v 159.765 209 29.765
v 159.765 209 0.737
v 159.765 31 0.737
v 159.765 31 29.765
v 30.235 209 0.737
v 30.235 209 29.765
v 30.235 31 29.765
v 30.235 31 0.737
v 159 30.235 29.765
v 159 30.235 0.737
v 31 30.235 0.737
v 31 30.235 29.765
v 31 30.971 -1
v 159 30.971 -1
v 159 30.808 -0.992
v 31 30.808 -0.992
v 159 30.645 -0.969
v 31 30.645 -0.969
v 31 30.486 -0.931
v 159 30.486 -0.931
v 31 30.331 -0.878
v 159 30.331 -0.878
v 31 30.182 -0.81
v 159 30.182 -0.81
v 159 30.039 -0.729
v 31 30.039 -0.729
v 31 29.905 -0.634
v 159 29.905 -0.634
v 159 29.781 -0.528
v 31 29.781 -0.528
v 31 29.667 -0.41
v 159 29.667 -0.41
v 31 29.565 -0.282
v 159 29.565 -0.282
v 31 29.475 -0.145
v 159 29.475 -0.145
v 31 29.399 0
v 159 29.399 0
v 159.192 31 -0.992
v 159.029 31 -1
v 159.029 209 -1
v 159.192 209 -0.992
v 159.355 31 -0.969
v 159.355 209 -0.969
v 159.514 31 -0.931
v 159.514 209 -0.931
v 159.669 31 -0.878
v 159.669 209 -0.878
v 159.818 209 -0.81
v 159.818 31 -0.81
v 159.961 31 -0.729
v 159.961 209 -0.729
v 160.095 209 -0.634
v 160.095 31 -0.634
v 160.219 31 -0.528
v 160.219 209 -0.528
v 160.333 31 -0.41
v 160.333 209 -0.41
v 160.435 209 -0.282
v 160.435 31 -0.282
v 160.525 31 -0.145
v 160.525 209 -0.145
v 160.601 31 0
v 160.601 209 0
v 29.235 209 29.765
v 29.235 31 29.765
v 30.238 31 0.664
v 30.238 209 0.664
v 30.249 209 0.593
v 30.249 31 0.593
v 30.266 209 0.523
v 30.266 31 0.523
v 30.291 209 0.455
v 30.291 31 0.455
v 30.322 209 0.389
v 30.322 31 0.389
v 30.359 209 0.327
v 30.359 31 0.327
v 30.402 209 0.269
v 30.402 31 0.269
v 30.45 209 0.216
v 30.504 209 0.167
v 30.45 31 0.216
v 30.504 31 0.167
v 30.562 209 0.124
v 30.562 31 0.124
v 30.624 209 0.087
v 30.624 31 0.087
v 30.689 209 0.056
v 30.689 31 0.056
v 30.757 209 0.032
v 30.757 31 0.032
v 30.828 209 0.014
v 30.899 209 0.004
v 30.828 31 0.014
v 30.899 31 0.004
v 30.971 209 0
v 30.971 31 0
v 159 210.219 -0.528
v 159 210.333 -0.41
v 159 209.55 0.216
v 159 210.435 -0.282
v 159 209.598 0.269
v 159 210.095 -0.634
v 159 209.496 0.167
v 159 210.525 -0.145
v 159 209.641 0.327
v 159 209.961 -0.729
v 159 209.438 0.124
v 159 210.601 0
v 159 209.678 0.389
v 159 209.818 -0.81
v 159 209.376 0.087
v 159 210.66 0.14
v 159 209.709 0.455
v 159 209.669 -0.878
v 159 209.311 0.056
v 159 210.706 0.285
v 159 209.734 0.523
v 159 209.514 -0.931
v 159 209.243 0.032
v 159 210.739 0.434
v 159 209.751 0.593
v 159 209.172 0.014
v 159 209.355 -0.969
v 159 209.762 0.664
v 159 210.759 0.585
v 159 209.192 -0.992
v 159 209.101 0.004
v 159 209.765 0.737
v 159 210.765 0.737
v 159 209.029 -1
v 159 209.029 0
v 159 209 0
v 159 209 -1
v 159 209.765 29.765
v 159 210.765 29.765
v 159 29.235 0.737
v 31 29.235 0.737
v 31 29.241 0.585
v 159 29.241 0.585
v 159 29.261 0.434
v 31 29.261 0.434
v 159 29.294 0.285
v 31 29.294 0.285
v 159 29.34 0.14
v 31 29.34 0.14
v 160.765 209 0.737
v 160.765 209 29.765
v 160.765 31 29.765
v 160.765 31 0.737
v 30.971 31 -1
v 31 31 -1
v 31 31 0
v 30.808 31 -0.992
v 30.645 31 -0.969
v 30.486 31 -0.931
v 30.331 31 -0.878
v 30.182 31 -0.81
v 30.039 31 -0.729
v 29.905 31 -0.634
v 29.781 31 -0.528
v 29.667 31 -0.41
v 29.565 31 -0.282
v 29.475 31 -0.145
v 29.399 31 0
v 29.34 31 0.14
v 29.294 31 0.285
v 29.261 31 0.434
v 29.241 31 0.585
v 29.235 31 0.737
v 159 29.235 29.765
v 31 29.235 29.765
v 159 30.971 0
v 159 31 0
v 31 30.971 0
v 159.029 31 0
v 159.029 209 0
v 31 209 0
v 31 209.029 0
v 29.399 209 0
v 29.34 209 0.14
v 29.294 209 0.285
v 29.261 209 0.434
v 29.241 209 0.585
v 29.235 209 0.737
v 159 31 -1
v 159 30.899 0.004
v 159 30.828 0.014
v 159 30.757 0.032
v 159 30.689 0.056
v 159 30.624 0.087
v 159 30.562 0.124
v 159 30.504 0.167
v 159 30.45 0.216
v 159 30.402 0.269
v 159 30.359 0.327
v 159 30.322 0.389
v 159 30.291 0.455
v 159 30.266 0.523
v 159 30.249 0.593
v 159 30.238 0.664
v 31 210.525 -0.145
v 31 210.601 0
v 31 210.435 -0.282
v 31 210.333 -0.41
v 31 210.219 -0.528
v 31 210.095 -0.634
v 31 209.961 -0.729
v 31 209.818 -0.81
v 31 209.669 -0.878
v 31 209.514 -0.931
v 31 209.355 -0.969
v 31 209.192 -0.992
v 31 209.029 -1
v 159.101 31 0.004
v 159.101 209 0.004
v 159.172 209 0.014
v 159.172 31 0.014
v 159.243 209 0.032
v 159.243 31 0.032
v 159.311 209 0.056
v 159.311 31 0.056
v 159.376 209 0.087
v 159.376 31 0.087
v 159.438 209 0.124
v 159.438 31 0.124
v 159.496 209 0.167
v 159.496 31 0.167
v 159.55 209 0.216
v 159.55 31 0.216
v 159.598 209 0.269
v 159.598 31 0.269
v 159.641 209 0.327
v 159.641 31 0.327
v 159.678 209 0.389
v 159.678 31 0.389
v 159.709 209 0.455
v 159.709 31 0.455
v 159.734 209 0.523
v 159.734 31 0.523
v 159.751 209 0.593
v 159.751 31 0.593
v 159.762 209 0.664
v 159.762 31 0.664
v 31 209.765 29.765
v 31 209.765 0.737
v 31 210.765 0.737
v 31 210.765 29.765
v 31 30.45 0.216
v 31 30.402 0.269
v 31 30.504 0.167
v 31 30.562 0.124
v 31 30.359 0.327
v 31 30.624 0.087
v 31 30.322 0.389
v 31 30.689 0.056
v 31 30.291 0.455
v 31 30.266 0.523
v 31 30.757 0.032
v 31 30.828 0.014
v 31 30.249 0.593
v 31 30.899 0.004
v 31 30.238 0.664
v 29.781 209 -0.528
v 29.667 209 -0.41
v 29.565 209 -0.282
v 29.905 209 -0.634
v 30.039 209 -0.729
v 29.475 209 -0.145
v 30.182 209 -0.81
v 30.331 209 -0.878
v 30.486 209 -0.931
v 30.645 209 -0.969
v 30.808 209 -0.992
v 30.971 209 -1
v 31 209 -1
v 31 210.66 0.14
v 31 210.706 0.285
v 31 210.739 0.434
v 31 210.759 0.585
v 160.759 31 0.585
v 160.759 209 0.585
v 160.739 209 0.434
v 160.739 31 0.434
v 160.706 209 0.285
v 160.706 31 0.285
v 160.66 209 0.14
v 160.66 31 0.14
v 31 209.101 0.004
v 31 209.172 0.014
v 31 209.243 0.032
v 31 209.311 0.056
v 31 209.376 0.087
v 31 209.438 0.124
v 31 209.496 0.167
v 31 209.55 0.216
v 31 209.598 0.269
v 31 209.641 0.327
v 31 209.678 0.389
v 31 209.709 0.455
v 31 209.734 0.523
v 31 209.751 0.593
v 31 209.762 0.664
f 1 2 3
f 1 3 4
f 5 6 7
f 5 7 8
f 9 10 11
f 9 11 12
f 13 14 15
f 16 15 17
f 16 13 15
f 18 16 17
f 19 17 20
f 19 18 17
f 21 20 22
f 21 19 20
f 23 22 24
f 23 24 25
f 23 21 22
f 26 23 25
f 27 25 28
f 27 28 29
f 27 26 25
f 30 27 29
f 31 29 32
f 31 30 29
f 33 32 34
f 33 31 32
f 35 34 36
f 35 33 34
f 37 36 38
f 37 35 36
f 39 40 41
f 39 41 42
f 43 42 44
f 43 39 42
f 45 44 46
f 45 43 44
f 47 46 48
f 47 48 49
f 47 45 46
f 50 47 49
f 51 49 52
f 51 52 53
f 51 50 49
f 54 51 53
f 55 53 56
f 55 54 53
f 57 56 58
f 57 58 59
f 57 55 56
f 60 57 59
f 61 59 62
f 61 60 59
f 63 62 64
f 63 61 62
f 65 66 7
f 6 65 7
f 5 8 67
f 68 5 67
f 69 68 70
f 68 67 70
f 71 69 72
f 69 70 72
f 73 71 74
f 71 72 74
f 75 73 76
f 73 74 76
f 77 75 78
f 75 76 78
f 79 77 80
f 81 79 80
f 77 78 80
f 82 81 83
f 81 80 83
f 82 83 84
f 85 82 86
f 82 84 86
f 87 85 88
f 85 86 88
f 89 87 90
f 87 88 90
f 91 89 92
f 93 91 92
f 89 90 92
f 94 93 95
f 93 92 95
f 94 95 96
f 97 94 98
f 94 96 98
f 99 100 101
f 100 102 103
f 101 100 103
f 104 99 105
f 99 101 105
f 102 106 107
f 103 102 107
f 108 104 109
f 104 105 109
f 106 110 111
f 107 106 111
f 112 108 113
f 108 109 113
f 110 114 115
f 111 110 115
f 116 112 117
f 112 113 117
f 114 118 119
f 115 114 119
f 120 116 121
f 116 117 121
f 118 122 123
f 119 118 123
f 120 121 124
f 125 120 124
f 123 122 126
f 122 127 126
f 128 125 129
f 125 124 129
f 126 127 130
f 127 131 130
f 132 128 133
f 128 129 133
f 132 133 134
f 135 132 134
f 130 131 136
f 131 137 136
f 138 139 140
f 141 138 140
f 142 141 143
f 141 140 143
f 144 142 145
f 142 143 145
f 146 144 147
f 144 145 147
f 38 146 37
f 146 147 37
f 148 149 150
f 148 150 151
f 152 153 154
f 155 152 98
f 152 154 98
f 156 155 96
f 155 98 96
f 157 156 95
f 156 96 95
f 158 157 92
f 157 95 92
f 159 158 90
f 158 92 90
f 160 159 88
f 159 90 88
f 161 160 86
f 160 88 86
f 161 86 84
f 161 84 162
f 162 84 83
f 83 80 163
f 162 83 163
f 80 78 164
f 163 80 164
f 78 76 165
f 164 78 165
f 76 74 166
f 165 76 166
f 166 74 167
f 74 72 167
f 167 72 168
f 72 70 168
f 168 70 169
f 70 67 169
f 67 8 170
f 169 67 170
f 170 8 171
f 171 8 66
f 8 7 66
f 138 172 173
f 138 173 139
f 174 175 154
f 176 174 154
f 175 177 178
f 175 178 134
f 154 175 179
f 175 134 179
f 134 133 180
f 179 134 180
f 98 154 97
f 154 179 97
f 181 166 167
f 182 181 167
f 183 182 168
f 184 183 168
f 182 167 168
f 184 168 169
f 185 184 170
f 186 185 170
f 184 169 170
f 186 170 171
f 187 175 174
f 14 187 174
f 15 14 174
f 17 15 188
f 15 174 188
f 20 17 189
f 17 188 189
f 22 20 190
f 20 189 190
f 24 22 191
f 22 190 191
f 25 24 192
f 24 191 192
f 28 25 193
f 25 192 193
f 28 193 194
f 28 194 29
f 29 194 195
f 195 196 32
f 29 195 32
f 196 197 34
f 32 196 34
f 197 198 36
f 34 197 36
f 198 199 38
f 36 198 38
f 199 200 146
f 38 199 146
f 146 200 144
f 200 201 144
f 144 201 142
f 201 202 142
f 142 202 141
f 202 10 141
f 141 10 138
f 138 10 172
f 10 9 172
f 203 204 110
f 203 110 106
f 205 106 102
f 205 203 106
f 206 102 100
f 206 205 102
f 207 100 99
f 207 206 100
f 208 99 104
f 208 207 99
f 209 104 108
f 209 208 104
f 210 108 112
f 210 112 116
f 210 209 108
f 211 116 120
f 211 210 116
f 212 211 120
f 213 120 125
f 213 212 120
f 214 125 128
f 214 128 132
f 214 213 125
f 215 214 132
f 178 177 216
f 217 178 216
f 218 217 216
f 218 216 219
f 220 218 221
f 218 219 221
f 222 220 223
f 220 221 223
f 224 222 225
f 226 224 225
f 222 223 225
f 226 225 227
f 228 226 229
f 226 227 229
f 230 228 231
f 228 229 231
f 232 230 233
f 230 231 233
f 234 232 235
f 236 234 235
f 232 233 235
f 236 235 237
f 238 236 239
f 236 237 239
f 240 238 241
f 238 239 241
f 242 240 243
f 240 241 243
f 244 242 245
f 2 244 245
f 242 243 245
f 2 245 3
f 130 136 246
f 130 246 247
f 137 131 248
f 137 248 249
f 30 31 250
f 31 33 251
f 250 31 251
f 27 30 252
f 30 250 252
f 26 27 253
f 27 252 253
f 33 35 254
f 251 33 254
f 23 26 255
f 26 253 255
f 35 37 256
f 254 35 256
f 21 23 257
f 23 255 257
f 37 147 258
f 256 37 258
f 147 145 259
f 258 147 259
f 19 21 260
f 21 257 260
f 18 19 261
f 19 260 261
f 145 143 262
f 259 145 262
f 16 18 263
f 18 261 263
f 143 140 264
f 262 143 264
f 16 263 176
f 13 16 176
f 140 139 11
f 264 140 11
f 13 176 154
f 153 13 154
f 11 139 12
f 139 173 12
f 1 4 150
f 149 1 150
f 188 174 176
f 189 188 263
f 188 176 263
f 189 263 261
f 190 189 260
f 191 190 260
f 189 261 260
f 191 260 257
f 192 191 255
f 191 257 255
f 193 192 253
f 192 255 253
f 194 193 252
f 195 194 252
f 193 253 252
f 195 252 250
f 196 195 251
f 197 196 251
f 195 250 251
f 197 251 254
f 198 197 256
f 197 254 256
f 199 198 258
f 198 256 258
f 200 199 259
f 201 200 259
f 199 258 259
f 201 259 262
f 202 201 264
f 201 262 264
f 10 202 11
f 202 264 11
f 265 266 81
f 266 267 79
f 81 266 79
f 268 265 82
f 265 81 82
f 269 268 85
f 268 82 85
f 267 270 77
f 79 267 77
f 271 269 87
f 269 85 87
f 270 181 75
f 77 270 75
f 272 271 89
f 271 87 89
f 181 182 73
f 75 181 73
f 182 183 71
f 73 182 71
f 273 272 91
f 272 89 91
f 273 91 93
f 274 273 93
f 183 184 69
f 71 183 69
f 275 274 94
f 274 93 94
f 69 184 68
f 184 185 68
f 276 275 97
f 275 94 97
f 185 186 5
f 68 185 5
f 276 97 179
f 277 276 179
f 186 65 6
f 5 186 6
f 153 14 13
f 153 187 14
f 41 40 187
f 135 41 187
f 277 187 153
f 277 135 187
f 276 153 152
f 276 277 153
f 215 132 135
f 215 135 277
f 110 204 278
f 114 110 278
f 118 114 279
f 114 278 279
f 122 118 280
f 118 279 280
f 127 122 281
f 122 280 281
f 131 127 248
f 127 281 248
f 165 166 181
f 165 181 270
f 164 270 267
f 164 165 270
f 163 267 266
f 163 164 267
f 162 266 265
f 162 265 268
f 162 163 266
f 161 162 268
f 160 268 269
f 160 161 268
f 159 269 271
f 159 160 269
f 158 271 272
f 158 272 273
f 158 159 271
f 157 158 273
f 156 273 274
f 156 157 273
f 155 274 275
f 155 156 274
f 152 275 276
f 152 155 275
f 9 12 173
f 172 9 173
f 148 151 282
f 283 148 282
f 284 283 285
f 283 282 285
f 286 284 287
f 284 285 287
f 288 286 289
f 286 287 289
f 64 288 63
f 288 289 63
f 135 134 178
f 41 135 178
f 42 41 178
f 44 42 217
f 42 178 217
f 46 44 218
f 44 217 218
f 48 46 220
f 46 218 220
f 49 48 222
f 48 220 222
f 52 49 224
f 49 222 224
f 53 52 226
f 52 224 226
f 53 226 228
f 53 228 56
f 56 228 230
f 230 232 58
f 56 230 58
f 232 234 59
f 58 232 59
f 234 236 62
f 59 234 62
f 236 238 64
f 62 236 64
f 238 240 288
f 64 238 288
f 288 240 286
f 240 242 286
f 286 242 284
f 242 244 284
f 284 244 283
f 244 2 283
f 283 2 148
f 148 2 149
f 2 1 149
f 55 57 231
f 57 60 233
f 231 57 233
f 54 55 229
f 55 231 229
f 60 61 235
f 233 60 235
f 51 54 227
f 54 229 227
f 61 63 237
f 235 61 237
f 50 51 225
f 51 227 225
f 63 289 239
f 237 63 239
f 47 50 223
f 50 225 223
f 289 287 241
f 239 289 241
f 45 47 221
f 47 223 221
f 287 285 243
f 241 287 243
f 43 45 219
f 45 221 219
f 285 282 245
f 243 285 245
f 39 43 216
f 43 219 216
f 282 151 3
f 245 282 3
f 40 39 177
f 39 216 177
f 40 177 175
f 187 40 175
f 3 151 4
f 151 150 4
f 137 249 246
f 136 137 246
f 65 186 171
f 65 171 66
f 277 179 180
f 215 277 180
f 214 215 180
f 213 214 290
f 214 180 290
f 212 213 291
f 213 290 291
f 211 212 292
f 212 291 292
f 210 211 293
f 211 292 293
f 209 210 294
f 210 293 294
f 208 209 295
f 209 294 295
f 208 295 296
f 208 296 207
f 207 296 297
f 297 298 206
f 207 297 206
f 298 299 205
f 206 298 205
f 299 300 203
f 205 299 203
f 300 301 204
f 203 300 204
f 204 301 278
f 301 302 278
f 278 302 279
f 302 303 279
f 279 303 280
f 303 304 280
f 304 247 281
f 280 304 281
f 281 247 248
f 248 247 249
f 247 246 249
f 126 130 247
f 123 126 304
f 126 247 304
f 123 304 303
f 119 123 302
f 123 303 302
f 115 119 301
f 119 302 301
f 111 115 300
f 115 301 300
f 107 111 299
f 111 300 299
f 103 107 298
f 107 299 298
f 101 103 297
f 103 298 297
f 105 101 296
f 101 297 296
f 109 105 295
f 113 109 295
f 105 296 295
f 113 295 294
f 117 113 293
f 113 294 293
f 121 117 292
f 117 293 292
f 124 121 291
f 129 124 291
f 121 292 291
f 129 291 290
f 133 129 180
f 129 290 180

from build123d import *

# Parameters (mm, degrees)
BASE_FLANGE1_DEPTH         = 1
SKETCHED_START             = 31
SKETCHED_BEND1_DEPTH       = 178
SKETCHED_BEND1_2_DEPTH     = 128
SKETCHED_BEND1_3_DEPTH     = 178
SKETCHED_BEND1_4_OUTLINE_W = 128
SKETCHED_BEND1_4_OUTLINE_H = 1
SKETCHED_BEND1_4_DEPTH     = 29.234623369
SKETCHED_START_2           = 210.765376631
SKETCHED_BEND1_5_OUTLINE_W = 128
SKETCHED_BEND1_5_OUTLINE_H = 1
SKETCHED_BEND1_5_DEPTH     = 29.234623369
SKETCHED_BEND1_6_DEPTH     = 128
SKETCHED_BEND1_7_OUTLINE_W = 178
SKETCHED_BEND1_7_OUTLINE_H = 1
SKETCHED_BEND1_7_DEPTH     = 29.234623369
SKETCHED_START_3           = 160.765376631
SKETCHED_BEND1_8_OUTLINE_W = 178
SKETCHED_BEND1_8_OUTLINE_H = 1
SKETCHED_BEND1_8_DEPTH     = 29.234623369


# Read off the part's stored shape, not the designer's step: Sketched Bend1
# Sheet-metal steps are written as plain solids
with BuildPart() as part:
    # Sketch1 → Base-Flange1 (new body)
    with BuildSketch(Plane.XY):
        Polygon((0, 209), (31, 209), (31, 240), (159, 240), (159, 209), (190, 209), (190, 31), (159, 31), (159, 0), (31, 0), (31, 31), (0, 31), align=None)
    extrude(amount=-BASE_FLANGE1_DEPTH)

    # Sketched Bend1 outline → Sketched Bend1 (add)
    with BuildSketch(Plane(origin=(0, 0, 0), x_dir=(1, 0, 0), z_dir=(0, 1, 0)).offset(SKETCHED_START)):
        with BuildLine():
            Line((29.234623369, -0.7366), (29.234623369, -29.765376631))
            Line((29.234623369, -29.765376631), (30.234623369, -29.765376631))
            Line((30.234623369, -29.765376631), (30.234623369, -0.7366))
            ThreePointArc((30.234623369, -0.7366), (30.450368514, -0.215745145), (30.971223369, 0))
            Line((30.971223369, 0), (29.398582279, 0))
            ThreePointArc((29.398582279, 0), (29.276108612, -0.359286442), (29.234623369, -0.7366))
        make_face()
        with BuildLine():
            Line((160.601417721, 0), (159.028776631, 0))
            ThreePointArc((159.028776631, 0), (159.549631486, -0.215745145), (159.765376631, -0.7366))
            Line((159.765376631, -0.7366), (159.765376631, -29.765376631))
            Line((159.765376631, -29.765376631), (160.765376631, -29.765376631))
            Line((160.765376631, -29.765376631), (160.765376631, -0.7366))
            ThreePointArc((160.765376631, -0.7366), (160.723891388, -0.359286442), (160.601417721, 0))
        make_face()
    extrude(amount=SKETCHED_BEND1_DEPTH)

    # Sketched Bend1 2 outline → Sketched Bend1 2 (add)
    with BuildSketch(Plane.YZ.offset(SKETCHED_START)):
        with BuildLine():
            Line((209.028776631, 0), (210.601417721, 0))
            ThreePointArc((210.601417721, 0), (210.723891388, 0.359286442), (210.765376631, 0.7366))
            Line((210.765376631, 0.7366), (210.765376631, 29.765376631))
            Line((210.765376631, 29.765376631), (209.765376631, 29.765376631))
            Line((209.765376631, 29.765376631), (209.765376631, 0.7366))
            ThreePointArc((209.765376631, 0.7366), (209.549631486, 0.215745145), (209.028776631, 0))
        make_face()
        with BuildLine():
            ThreePointArc((29.234623369, 0.7366), (29.276108612, 0.359286442), (29.398582279, 0))
            Line((29.398582279, 0), (30.971223369, 0))
            ThreePointArc((30.971223369, 0), (30.450368514, 0.215745145), (30.234623369, 0.7366))
            Line((30.234623369, 0.7366), (30.234623369, 29.765376631))
            Line((30.234623369, 29.765376631), (29.234623369, 29.765376631))
            Line((29.234623369, 29.765376631), (29.234623369, 0.7366))
        make_face()
    extrude(amount=SKETCHED_BEND1_2_DEPTH)

    # Sketched Bend1 3 outline → Sketched Bend1 3 (cut)
    with BuildSketch(Plane(origin=(0, 0, 0), x_dir=(1, 0, 0), z_dir=(0, 1, 0)).offset(SKETCHED_START)):
        with BuildLine():
            Line((0, 0), (29.398582279, 0))
            ThreePointArc((29.398582279, 0), (30.039397205, 0.728828115), (30.971223369, 1))
            Line((30.971223369, 1), (0, 1))
            Line((0, 1), (0, 0))
        make_face()
        with BuildLine():
            Line((190, 1), (159.028776631, 1))
            ThreePointArc((159.028776631, 1), (159.960602795, 0.728828115), (160.601417721, 0))
            Line((160.601417721, 0), (190, 0))
            Line((190, 0), (190, 1))
        make_face()
    extrude(amount=SKETCHED_BEND1_3_DEPTH, mode=Mode.SUBTRACT)

    # Sketched Bend1 4 outline → Sketched Bend1 4 (cut)
    with BuildSketch(Plane(origin=(0, 0, 0), x_dir=(1, 0, 0), z_dir=(0, 1, 0))):
        with Locations((95, 0.5)):
            Rectangle(SKETCHED_BEND1_4_OUTLINE_W, SKETCHED_BEND1_4_OUTLINE_H)
    extrude(amount=SKETCHED_BEND1_4_DEPTH, mode=Mode.SUBTRACT)

    # Sketched Bend1 5 outline → Sketched Bend1 5 (cut)
    with BuildSketch(Plane(origin=(0, 0, 0), x_dir=(1, 0, 0), z_dir=(0, 1, 0)).offset(SKETCHED_START_2)):
        with Locations((95, 0.5)):
            Rectangle(SKETCHED_BEND1_5_OUTLINE_W, SKETCHED_BEND1_5_OUTLINE_H)
    extrude(amount=SKETCHED_BEND1_5_DEPTH, mode=Mode.SUBTRACT)

    # Sketched Bend1 6 outline → Sketched Bend1 6 (cut)
    with BuildSketch(Plane.YZ.offset(SKETCHED_START)):
        with BuildLine():
            ThreePointArc((210.601417721, 0), (209.960602795, -0.728828115), (209.028776631, -1))
            Line((209.028776631, -1), (240, -1))
            Line((240, -1), (240, 0))
            Line((240, 0), (210.601417721, 0))
        make_face()
        with BuildLine():
            Line((0, -1), (30.971223369, -1))
            ThreePointArc((30.971223369, -1), (30.039397205, -0.728828115), (29.398582279, 0))
            Line((29.398582279, 0), (0, 0))
            Line((0, 0), (0, -1))
        make_face()
    extrude(amount=SKETCHED_BEND1_6_DEPTH, mode=Mode.SUBTRACT)

    # Sketched Bend1 7 outline → Sketched Bend1 7 (cut)
    with BuildSketch(Plane.YZ):
        with Locations((120, -0.5)):
            Rectangle(SKETCHED_BEND1_7_OUTLINE_W, SKETCHED_BEND1_7_OUTLINE_H)
    extrude(amount=SKETCHED_BEND1_7_DEPTH, mode=Mode.SUBTRACT)

    # Sketched Bend1 8 outline → Sketched Bend1 8 (cut)
    with BuildSketch(Plane.YZ.offset(SKETCHED_START_3)):
        with Locations((120, -0.5)):
            Rectangle(SKETCHED_BEND1_8_OUTLINE_W, SKETCHED_BEND1_8_OUTLINE_H)
    extrude(amount=SKETCHED_BEND1_8_DEPTH, mode=Mode.SUBTRACT)


solid = part.part
